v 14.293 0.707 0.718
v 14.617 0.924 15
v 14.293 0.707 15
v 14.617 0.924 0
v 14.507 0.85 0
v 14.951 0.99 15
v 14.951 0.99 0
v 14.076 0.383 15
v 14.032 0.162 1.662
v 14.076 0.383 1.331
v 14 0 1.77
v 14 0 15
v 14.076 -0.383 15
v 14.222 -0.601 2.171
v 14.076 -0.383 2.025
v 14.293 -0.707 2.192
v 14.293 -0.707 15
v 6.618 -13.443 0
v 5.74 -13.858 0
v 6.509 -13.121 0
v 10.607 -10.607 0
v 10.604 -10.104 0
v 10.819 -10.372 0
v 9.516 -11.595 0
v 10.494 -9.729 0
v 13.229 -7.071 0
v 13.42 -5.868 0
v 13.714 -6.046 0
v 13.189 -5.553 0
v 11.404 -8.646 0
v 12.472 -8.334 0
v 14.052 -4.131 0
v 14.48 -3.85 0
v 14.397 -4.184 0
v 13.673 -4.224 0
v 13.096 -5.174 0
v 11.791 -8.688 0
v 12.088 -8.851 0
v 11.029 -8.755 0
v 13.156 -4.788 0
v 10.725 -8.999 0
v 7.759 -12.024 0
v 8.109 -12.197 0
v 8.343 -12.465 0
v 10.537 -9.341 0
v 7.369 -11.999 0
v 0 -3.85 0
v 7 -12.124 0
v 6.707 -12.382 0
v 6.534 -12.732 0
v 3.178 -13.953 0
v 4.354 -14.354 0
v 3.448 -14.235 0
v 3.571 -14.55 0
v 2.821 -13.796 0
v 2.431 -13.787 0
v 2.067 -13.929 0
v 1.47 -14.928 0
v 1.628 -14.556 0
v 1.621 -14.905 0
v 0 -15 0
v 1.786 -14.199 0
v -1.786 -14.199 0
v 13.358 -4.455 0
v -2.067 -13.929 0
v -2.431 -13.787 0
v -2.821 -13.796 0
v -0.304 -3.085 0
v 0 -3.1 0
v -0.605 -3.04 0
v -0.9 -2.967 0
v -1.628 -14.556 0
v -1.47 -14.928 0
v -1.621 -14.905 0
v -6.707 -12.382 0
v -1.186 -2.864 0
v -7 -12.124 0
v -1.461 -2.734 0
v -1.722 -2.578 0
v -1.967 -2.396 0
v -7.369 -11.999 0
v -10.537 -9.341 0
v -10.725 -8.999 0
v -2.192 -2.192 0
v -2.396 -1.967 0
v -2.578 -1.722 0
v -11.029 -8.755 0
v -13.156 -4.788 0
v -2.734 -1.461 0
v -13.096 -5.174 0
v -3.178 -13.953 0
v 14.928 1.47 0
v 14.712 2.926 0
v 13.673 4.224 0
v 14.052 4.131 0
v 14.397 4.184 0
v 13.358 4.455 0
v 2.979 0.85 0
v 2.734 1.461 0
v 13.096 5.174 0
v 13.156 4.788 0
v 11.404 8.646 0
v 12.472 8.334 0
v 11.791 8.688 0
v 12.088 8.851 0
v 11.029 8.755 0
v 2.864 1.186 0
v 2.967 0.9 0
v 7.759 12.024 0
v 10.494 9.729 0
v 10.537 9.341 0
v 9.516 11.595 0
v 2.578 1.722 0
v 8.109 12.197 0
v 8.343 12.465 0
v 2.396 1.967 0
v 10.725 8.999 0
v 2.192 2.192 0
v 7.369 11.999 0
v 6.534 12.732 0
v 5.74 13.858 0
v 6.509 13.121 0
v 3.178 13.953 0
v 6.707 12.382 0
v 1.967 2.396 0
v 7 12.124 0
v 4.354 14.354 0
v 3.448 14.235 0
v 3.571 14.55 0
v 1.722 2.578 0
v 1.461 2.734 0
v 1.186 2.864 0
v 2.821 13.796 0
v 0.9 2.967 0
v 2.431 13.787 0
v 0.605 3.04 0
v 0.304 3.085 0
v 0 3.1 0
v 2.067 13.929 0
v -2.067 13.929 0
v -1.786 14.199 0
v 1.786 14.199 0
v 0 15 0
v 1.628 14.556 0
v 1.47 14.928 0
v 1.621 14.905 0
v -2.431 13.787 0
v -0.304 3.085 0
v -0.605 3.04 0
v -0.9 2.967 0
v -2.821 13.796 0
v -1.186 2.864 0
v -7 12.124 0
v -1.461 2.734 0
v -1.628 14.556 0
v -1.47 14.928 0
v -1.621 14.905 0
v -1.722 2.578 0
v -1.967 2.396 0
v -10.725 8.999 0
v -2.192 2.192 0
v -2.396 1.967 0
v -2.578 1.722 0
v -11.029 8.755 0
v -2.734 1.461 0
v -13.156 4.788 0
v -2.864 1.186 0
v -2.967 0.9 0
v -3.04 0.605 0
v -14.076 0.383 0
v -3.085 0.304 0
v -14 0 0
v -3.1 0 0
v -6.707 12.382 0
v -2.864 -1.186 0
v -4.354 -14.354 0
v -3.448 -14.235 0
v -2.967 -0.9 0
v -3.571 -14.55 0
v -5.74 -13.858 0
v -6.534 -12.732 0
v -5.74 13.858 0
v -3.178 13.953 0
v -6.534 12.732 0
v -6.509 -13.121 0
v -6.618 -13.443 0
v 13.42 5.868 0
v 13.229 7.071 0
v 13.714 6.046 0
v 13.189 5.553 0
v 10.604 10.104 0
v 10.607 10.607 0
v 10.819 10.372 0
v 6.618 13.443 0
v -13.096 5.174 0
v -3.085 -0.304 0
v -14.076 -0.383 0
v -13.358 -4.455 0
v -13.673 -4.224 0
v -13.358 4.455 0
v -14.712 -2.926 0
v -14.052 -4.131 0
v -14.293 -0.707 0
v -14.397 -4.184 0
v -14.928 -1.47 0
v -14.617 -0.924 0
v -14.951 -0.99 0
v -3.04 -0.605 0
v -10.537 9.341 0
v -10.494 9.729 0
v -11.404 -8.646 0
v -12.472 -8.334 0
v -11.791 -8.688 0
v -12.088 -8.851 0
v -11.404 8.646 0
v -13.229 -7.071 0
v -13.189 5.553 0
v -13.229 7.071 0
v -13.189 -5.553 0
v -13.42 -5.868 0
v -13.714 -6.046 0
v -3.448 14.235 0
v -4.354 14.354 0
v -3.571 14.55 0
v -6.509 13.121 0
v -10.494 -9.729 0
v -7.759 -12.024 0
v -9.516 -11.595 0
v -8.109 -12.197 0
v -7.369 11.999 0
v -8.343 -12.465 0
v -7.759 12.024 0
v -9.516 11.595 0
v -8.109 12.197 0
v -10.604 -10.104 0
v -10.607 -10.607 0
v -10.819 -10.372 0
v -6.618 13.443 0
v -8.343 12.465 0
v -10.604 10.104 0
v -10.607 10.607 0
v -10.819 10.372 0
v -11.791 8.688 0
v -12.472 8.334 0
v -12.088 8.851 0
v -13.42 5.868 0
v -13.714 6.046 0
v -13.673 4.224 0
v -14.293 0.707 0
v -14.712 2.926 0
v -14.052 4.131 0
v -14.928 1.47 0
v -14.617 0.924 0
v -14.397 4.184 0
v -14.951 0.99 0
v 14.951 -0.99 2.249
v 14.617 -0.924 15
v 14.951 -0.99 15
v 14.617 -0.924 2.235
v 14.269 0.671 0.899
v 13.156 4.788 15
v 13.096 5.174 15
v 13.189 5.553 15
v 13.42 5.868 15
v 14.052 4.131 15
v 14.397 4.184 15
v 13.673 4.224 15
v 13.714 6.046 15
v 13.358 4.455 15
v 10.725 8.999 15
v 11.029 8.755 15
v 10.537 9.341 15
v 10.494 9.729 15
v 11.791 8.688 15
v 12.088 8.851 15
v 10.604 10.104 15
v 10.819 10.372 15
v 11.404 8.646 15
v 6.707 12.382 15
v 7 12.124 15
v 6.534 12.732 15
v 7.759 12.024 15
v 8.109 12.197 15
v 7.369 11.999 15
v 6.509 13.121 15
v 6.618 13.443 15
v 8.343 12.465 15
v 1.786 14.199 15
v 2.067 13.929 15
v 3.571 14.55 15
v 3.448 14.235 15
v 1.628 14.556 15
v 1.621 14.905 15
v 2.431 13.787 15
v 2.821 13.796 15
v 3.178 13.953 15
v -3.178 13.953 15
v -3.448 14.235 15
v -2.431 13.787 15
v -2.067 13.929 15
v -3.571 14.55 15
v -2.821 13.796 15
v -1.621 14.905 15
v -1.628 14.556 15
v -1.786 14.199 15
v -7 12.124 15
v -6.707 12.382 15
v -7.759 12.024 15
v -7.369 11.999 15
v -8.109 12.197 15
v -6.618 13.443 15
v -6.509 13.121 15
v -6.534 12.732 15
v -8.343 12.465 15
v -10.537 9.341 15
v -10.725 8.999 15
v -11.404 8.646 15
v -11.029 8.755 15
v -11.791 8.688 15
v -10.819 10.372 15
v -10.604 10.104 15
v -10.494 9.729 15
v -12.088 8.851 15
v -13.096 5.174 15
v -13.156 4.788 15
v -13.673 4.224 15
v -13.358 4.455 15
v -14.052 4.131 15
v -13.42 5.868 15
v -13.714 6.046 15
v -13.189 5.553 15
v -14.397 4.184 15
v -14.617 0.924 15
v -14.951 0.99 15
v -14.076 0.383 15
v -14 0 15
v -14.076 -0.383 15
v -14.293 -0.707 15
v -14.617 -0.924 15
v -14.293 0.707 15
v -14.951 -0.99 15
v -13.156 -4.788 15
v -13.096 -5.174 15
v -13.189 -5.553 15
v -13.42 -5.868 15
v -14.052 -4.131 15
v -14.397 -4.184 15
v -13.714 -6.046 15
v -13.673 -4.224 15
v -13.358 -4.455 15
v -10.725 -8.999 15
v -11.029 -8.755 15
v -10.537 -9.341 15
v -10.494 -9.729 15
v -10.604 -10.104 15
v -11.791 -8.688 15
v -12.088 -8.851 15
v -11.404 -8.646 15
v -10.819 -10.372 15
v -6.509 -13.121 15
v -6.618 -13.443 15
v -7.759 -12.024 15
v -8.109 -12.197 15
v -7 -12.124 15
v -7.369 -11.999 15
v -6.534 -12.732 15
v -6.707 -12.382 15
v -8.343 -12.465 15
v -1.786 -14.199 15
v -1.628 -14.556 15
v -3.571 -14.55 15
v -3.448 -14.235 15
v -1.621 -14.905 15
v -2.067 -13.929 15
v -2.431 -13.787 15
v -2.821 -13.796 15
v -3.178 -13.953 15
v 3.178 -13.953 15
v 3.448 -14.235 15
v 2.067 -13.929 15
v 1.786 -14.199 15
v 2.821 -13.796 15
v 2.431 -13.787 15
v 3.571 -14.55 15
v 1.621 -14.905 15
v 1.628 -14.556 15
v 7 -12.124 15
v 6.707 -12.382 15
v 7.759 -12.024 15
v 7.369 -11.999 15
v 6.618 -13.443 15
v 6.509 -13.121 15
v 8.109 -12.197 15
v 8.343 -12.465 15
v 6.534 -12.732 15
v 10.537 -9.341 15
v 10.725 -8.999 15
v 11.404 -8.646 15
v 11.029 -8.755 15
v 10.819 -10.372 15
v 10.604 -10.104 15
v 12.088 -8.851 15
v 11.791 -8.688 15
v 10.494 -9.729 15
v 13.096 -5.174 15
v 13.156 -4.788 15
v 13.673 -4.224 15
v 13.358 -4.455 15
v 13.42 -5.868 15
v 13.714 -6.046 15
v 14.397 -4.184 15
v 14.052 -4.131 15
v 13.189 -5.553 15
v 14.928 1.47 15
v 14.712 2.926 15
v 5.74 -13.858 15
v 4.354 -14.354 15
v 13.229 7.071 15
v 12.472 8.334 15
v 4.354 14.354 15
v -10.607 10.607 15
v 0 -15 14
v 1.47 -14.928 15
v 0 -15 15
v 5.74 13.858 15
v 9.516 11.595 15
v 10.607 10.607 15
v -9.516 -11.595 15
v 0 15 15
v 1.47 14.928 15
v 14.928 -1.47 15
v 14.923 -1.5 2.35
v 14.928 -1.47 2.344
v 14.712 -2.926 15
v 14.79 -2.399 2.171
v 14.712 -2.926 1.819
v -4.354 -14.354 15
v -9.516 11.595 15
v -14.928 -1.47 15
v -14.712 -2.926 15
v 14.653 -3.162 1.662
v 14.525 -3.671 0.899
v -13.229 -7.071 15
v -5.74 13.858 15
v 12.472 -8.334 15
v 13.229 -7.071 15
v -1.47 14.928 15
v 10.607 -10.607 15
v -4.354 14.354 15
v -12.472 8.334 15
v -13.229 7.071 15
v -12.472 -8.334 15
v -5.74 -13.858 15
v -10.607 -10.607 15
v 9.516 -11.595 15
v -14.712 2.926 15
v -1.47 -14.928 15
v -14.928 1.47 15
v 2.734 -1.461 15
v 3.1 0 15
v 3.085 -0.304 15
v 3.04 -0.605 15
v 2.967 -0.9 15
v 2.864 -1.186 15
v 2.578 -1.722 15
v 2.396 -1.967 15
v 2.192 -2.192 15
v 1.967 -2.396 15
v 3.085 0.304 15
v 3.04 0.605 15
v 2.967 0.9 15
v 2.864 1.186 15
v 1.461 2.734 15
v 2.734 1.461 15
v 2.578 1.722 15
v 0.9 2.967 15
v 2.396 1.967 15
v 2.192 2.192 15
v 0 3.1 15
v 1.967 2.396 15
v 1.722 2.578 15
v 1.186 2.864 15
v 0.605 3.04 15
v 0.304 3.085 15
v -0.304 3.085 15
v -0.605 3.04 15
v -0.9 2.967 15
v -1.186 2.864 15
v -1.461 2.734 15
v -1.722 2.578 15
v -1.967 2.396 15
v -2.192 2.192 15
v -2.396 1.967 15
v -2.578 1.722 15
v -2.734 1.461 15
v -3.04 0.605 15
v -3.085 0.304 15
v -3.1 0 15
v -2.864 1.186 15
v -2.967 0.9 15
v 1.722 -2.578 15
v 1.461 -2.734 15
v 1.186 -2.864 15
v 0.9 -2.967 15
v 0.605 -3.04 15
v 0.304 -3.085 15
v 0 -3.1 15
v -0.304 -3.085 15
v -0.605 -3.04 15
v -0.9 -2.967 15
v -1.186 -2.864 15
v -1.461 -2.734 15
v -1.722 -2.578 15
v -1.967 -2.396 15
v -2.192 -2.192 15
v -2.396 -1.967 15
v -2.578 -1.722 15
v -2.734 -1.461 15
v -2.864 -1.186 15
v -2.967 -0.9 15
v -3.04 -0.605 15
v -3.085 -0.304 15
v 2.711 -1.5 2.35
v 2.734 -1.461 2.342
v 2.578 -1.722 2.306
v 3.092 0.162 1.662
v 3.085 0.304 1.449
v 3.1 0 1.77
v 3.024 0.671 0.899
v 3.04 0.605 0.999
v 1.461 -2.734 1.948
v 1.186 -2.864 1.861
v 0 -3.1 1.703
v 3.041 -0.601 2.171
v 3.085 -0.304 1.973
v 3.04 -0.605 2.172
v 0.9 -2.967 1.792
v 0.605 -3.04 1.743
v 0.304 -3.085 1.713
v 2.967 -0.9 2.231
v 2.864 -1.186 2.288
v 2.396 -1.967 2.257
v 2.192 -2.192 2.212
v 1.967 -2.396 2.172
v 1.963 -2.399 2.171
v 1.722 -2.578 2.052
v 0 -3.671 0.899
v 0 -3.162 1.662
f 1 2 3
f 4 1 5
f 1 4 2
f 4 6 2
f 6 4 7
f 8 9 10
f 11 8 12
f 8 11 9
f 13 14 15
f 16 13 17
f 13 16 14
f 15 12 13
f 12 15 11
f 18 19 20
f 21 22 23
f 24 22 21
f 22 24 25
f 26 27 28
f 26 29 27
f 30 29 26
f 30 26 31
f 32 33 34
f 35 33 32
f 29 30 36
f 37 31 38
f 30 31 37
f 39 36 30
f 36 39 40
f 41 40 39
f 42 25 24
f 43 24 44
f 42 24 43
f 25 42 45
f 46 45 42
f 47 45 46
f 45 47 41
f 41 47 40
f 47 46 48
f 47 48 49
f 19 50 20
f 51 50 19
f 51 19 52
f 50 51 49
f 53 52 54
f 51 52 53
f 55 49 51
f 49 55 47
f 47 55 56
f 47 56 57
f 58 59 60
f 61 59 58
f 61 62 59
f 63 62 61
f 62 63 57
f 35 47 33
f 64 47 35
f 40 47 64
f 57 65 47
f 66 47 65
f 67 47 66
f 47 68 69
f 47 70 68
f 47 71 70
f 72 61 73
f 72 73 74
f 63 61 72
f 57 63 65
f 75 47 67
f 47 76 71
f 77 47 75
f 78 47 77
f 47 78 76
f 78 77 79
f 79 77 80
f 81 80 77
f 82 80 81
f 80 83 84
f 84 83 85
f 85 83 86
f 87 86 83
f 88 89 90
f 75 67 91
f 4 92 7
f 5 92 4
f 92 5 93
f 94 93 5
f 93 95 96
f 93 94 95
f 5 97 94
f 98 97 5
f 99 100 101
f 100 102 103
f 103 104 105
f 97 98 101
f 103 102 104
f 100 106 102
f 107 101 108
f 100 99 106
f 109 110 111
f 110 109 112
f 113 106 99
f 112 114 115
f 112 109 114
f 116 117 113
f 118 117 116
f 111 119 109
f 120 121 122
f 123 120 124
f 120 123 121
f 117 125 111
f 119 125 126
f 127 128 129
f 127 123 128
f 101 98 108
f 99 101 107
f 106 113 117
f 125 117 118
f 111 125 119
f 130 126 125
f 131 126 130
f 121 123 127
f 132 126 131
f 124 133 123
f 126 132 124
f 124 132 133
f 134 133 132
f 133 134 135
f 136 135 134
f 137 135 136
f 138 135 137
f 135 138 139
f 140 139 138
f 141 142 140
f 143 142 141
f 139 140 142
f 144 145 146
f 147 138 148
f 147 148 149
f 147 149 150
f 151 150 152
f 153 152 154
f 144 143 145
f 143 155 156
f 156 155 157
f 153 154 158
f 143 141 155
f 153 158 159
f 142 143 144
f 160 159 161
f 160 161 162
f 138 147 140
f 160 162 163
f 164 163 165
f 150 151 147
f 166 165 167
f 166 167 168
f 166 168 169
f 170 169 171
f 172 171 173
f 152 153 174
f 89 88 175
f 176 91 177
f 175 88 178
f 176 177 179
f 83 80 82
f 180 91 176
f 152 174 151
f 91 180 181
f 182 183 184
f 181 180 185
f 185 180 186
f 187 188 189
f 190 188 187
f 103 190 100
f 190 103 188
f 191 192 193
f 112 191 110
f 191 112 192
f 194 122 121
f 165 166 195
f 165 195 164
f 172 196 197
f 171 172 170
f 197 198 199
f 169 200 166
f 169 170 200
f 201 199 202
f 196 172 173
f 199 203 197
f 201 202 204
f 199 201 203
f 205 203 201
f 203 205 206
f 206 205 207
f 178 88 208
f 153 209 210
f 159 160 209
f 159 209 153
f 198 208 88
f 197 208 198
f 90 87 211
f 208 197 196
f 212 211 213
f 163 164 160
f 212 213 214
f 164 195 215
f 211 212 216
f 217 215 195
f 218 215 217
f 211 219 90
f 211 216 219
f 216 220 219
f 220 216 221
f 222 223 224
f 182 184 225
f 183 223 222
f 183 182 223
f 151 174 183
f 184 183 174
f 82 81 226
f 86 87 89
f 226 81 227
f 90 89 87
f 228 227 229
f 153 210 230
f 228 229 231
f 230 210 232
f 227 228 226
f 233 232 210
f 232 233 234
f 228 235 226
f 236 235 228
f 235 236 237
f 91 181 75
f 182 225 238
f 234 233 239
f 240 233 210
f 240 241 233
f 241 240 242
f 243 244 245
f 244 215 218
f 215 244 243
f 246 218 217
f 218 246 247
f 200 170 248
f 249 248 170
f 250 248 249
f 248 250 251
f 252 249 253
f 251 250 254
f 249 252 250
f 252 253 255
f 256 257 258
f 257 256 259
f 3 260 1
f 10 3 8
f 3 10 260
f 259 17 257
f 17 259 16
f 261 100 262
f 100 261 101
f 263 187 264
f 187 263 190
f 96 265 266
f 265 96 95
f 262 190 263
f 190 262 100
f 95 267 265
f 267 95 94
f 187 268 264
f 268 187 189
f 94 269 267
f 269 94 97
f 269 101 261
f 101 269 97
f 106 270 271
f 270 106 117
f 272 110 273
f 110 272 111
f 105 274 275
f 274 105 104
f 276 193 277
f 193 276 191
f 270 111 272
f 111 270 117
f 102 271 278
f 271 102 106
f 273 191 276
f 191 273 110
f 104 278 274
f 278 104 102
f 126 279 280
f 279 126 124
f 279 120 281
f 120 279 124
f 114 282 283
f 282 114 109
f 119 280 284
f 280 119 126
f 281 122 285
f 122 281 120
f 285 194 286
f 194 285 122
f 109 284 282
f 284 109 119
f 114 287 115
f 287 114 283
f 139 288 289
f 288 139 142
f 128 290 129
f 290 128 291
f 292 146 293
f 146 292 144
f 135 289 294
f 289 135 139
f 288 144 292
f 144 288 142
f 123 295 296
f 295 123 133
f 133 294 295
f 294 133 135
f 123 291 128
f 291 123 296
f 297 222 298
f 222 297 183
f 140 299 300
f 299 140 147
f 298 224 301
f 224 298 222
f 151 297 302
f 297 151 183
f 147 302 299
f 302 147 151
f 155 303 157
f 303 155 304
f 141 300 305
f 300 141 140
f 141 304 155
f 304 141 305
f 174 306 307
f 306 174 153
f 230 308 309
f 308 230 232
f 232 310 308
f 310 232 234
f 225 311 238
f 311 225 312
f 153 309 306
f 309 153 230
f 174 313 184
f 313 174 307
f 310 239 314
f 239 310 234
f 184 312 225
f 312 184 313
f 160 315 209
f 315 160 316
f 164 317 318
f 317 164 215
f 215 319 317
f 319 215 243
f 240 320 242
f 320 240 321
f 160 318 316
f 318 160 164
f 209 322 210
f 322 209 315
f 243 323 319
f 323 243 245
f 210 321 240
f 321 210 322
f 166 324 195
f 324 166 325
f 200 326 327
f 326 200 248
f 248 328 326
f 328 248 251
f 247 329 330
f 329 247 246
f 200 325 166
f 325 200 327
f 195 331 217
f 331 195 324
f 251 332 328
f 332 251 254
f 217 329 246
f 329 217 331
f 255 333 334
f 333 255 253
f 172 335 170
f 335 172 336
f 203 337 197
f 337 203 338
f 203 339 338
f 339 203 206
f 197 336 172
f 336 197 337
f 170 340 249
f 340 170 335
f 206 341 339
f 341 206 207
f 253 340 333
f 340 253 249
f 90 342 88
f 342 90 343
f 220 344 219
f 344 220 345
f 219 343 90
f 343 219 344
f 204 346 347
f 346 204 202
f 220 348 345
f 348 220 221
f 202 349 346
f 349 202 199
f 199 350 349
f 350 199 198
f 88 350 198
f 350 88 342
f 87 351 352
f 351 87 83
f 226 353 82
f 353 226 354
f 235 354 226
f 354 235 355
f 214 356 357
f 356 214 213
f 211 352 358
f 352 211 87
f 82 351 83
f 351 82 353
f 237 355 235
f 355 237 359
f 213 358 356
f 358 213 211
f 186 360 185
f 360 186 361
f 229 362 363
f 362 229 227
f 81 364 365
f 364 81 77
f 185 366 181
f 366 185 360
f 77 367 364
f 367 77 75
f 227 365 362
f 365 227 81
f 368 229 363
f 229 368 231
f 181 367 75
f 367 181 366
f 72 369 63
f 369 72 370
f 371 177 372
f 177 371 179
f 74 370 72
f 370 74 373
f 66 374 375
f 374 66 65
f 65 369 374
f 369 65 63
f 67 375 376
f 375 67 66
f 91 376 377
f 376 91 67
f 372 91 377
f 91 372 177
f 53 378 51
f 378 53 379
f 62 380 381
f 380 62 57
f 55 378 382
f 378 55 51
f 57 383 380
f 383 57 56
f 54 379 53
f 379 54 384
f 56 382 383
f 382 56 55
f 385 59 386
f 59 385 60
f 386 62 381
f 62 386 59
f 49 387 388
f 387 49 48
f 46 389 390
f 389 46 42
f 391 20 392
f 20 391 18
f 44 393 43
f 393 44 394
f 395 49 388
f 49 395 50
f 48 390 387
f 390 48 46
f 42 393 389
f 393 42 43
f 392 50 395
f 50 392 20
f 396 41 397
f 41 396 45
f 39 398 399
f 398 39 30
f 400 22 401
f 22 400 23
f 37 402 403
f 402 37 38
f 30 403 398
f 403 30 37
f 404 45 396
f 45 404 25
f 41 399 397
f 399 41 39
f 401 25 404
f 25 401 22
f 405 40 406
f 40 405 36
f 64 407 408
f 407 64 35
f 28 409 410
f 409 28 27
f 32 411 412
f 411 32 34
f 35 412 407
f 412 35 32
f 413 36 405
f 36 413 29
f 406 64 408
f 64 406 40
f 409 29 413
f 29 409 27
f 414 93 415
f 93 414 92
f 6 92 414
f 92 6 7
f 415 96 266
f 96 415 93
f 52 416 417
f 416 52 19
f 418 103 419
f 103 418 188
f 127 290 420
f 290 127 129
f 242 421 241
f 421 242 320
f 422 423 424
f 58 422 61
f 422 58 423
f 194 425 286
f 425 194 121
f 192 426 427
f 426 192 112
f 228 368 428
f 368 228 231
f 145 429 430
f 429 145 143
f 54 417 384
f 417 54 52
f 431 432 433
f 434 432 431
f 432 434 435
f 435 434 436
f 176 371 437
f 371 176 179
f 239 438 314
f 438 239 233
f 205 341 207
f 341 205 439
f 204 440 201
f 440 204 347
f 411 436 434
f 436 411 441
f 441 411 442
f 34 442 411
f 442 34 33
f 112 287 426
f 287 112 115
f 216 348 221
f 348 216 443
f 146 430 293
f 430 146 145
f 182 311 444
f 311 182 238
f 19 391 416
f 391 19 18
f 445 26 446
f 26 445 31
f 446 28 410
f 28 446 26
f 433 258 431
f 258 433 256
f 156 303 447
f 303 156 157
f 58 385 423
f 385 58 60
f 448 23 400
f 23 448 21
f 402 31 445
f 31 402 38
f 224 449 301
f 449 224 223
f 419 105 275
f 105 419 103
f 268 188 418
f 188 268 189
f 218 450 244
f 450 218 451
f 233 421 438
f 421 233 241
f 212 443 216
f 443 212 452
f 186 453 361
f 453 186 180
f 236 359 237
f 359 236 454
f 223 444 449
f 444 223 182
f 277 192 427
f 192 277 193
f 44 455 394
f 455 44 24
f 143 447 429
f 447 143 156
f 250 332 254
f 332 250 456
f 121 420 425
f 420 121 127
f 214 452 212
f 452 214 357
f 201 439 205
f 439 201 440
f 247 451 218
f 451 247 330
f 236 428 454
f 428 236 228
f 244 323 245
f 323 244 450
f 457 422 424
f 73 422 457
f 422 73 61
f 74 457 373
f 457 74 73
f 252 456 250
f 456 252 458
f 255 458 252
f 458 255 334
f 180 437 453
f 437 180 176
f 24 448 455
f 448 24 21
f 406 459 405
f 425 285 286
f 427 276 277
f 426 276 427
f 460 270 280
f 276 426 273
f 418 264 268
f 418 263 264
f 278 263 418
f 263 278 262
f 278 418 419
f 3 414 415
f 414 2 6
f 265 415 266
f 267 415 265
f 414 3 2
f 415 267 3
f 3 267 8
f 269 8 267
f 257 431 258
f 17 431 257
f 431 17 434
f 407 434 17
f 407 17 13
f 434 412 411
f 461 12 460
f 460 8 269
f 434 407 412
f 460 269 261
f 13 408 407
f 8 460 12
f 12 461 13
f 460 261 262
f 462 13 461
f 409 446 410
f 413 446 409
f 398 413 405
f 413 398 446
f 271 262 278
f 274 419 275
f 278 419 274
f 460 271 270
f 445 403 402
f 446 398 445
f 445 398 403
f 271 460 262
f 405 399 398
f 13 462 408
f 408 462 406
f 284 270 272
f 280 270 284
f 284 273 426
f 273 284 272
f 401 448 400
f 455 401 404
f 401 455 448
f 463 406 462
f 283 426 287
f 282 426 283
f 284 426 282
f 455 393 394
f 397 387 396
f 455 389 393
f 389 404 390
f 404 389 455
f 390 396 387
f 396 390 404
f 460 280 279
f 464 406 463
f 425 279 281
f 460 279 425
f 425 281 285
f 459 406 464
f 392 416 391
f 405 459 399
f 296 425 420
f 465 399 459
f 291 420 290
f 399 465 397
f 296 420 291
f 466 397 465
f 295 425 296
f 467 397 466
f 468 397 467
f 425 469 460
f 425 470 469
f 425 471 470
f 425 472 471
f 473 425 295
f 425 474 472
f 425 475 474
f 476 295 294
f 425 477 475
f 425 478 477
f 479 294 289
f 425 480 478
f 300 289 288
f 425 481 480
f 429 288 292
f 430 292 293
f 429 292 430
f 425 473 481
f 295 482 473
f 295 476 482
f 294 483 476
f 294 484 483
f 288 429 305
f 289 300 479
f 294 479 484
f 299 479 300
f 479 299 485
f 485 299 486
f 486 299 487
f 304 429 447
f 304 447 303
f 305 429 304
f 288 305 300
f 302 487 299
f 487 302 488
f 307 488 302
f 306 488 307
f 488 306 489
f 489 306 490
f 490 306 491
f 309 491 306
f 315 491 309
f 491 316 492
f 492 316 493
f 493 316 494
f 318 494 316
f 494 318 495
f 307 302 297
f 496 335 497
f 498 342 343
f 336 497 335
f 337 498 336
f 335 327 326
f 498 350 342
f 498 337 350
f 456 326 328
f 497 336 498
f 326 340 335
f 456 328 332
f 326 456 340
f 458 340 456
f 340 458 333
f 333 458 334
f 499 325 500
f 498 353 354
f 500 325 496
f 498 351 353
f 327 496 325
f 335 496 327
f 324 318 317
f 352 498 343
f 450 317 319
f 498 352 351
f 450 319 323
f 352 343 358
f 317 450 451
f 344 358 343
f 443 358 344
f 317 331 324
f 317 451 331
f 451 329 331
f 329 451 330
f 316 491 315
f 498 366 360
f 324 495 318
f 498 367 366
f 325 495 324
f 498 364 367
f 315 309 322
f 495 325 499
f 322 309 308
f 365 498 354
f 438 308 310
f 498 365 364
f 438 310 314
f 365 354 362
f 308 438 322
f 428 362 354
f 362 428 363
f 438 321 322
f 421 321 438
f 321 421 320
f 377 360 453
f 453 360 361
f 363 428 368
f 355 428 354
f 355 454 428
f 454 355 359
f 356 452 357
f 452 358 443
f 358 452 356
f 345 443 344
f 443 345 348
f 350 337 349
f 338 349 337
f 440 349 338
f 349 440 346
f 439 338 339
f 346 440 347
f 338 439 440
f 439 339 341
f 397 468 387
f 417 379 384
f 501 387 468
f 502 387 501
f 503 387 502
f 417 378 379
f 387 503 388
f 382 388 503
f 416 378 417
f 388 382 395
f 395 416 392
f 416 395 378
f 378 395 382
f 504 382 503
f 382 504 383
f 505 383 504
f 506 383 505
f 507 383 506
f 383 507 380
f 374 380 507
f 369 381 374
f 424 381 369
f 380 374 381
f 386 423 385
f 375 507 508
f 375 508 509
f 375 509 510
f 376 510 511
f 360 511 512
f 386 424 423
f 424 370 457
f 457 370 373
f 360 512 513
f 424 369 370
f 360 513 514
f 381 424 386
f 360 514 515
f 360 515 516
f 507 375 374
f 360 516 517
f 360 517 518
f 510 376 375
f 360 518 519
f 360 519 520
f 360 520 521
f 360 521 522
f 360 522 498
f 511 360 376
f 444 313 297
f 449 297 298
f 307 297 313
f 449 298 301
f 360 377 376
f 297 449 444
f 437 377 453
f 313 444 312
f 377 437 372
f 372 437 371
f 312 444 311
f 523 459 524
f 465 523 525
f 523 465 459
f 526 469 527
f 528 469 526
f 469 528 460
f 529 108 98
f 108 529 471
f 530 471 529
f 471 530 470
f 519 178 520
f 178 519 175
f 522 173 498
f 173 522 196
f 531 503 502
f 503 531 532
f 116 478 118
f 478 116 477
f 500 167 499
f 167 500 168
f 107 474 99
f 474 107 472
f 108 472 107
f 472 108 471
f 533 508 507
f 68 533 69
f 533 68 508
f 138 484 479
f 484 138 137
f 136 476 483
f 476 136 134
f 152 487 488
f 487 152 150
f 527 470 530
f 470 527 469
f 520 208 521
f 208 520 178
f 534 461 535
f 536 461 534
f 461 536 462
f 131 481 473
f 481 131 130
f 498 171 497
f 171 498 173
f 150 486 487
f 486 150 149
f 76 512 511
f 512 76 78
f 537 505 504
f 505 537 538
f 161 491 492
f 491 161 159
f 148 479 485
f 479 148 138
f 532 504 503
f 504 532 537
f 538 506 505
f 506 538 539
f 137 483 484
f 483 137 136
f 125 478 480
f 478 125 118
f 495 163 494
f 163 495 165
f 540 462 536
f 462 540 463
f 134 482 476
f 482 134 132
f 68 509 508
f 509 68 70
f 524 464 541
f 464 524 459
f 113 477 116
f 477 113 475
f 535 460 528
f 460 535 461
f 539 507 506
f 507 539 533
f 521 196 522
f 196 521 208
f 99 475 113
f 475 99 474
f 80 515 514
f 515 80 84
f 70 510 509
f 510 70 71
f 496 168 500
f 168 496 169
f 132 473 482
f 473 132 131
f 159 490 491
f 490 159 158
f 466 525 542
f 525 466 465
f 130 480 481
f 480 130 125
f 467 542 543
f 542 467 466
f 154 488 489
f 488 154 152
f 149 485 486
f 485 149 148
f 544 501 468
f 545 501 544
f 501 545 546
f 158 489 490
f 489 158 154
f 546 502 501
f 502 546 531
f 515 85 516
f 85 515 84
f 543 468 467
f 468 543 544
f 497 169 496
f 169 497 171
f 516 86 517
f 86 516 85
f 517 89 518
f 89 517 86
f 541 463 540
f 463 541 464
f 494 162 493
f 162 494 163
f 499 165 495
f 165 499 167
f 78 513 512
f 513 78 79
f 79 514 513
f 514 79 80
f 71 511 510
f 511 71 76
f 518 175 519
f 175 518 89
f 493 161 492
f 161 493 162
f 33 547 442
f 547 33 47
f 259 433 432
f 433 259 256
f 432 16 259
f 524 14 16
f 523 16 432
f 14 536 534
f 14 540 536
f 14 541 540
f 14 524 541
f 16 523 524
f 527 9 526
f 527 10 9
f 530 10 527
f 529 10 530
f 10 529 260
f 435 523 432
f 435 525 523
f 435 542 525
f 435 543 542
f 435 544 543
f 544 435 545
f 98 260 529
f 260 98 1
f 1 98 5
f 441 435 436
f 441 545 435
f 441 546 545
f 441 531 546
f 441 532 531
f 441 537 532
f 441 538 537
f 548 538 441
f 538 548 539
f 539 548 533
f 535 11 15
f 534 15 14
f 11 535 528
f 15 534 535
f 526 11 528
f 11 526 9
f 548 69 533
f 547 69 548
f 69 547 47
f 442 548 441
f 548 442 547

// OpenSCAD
// Replacement knob for a hotplate stirrer - a cylindrical knob with a D-shaped blind bore
// to fit a D-shaft, an outer grip groove pattern, and a top pointer groove. NOVEL general part.
//

d      = 30;
h      = 15;
shaft_d = 6.2;
flat   = 4.7;
grooves = 18;
groove_d = 2;
pointer_w = 1.5;
pointer_d = 1;

$fn = 64;

flat_normal = [0, 1, 0];
flat_point  = [0, -1.5, 0];   // the flat side of the D bore

difference() {
    cylinder(h = h, d = d);
    translate([0, 0, 0])
        cylinder(h = h + 1, d = shaft_d, $fn = 64);                 // round part of the bore
    translate(flat_point) rotate([0, 90, 0]) cylinder(h = h + 1, d = flat, $fn = 16);  // flat part of the bore
    for (i = [0 : grooves - 1])
        rotate([0, 0, i * 360 / grooves])
            translate([d / 2, 0, 0]) cylinder(h = h + 1, d = groove_d, $fn = 16);
    translate([0, 0, h - pointer_d])
        linear_extrude(h = pointer_d) polygon([[-d / 2, -d / 2], [d / 2, -d / 2], [d / 2, -d / 2 - pointer_w],
                                              [-d / 2, -d / 2 - pointer_w]]);
}
